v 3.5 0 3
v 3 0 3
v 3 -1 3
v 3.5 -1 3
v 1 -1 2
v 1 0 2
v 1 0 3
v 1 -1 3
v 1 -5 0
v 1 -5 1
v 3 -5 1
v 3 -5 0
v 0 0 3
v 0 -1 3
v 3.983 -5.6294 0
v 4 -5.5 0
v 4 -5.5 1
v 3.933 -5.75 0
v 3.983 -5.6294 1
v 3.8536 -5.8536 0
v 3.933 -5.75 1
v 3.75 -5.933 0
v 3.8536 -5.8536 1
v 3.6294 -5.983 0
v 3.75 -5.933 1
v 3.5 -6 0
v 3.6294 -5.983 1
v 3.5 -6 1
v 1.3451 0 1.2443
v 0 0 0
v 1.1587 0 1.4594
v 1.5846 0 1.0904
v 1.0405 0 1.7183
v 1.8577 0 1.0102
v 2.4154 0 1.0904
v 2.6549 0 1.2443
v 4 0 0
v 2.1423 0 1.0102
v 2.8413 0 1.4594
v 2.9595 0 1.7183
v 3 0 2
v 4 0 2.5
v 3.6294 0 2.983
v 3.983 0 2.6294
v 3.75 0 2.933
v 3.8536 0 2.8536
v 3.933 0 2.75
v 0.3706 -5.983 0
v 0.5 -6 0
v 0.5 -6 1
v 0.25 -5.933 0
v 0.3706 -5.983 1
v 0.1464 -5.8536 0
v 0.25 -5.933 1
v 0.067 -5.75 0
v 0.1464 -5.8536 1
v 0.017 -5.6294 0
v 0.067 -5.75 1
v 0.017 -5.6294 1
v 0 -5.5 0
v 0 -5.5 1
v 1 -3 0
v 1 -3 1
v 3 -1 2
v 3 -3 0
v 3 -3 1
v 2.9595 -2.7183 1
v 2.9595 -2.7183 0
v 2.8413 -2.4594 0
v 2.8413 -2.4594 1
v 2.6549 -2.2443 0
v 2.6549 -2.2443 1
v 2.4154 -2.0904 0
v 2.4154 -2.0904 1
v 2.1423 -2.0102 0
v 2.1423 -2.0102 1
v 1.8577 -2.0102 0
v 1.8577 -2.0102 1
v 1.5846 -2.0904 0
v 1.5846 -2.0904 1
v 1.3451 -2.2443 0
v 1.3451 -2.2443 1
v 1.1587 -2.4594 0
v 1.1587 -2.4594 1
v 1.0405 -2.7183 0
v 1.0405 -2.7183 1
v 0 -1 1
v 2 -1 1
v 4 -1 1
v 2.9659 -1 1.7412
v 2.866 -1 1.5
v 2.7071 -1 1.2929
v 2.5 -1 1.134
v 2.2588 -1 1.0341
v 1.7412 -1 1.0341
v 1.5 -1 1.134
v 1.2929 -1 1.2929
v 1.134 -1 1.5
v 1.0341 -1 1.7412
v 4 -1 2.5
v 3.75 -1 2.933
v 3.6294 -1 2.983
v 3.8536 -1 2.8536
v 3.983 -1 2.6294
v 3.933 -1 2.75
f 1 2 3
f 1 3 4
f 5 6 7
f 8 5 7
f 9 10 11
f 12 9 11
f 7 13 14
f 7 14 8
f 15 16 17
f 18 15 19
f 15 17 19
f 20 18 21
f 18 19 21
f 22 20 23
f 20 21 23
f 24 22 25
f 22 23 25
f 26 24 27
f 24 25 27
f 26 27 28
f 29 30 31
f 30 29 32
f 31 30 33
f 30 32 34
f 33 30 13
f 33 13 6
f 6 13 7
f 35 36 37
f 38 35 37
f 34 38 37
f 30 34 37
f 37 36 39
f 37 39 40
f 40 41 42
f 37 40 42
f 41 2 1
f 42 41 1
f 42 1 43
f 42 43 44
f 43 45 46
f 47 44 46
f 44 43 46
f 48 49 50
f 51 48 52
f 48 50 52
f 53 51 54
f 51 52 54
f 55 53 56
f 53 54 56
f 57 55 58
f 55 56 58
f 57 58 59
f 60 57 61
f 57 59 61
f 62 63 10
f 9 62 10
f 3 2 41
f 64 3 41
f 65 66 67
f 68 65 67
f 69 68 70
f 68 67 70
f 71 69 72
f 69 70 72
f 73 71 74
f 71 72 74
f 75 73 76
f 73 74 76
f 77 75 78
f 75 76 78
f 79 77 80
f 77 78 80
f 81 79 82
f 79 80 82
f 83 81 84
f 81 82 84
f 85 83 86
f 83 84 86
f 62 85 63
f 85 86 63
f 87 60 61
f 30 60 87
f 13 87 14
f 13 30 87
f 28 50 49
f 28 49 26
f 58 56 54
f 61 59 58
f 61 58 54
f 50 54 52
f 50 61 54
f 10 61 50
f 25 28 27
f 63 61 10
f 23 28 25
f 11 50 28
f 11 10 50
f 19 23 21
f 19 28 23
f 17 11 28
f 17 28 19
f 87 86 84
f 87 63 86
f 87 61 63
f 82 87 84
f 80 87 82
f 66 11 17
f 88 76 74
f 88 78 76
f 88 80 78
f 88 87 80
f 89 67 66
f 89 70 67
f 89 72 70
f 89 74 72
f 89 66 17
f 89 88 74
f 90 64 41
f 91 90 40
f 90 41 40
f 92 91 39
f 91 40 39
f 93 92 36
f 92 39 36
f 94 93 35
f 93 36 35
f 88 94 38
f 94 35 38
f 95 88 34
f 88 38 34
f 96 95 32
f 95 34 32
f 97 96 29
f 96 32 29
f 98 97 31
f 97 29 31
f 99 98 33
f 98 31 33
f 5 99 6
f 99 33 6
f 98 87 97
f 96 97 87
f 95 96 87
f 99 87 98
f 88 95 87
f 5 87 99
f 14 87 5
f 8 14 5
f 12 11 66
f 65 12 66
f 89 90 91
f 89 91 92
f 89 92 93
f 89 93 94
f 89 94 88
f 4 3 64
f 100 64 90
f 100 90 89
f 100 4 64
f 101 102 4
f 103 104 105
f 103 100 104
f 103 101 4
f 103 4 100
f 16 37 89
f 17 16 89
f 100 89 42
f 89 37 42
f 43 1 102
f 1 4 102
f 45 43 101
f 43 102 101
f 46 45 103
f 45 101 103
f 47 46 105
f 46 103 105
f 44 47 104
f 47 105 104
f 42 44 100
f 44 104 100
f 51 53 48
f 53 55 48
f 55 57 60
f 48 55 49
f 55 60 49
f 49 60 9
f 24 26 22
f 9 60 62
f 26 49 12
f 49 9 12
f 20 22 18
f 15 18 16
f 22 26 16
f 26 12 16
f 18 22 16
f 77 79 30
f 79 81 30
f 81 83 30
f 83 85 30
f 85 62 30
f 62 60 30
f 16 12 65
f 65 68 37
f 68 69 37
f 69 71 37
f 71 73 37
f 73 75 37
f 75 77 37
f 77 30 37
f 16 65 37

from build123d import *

# Parameters (mm, degrees)
F0_W      = 4
F0_H      = 3
F1_DEPTH  = 6
F2_R      = 0.5
F3_R      = 0.5
F5_DEPTH  = 25
F6_W      = 4
F6_H      = 5.8124
F7_DEPTH  = 2
F8_R      = 0.5
F10_DEPTH = 25


with BuildPart() as f1:
    # F0 (on Front) → F1 (new body)
    with BuildSketch(Plane.XZ):
        with Locations((2, 1.5)):
            Rectangle(F0_W, F0_H)
    extrude(amount=F1_DEPTH)

    # F2
    f2_edges = [f1.edges().sort_by_distance(p)[0] for p in [
        (4, -6, 1.5),
    ]]
    fillet(f2_edges, radius=F2_R)

    # F3
    f3_edges = [f1.edges().sort_by_distance(p)[0] for p in [
        (0, -6, 1.5),
    ]]
    fillet(f3_edges, radius=F3_R)

    # F4 (on face) → F5 (cut)
    with BuildSketch(Plane(origin=(0, 0, 0), x_dir=(-1, 0, 0), z_dir=(0, 1, 0))):
        with BuildLine():
            ThreePointArc((-3, 2), (-2, 1), (-1, 2))
            Line((-1, 2), (-2, 2))
            Line((-2, 2), (-3, 2))
        make_face()
        with BuildLine():
            Line((-2, 2), (-1, 2))
            ThreePointArc((-1, 2), (-2, 3), (-3, 2))
            Line((-3, 2), (-2, 2))
        make_face()
        with BuildLine():
            ThreePointArc((-3, 2), (-2.707107, 2.707107), (-2, 3))
            Line((-2, 3), (-3, 3))
            Line((-3, 3), (-3, 2))
        make_face()
        with BuildLine():
            Line((-1, 2), (-1, 3))
            Line((-1, 3), (-2, 3))
            ThreePointArc((-2, 3), (-1.292893, 2.707107), (-1, 2))
        make_face()
    extrude(amount=-F5_DEPTH, mode=Mode.SUBTRACT)

    # F6 (on face) → F7 (cut)
    with BuildSketch(Plane.XY.offset(3)):
        with Locations((2, -3.9062)):
            Rectangle(F6_W, F6_H)
    extrude(amount=-F7_DEPTH, mode=Mode.SUBTRACT)

    # F8
    f8_edges = [f1.edges().sort_by_distance(p)[0] for p in [
        (4, -0.5, 3),
    ]]
    fillet(f8_edges, radius=F8_R)

    # F9 (on face) → F10 (cut)
    with BuildSketch(Plane.XY.offset(1)):
        with BuildLine():
            ThreePointArc((1, -3), (2, -4), (3, -3))
            ThreePointArc((3, -3), (2, -2), (1, -3))
        make_face()
        with BuildLine():
            Line((3, -5), (3, -3))
            ThreePointArc((3, -3), (2, -4), (1, -3))
            Line((1, -3), (1, -5))
            Line((1, -5), (3, -5))
        make_face()
    extrude(amount=-F10_DEPTH, mode=Mode.SUBTRACT)


solid = f1.part
